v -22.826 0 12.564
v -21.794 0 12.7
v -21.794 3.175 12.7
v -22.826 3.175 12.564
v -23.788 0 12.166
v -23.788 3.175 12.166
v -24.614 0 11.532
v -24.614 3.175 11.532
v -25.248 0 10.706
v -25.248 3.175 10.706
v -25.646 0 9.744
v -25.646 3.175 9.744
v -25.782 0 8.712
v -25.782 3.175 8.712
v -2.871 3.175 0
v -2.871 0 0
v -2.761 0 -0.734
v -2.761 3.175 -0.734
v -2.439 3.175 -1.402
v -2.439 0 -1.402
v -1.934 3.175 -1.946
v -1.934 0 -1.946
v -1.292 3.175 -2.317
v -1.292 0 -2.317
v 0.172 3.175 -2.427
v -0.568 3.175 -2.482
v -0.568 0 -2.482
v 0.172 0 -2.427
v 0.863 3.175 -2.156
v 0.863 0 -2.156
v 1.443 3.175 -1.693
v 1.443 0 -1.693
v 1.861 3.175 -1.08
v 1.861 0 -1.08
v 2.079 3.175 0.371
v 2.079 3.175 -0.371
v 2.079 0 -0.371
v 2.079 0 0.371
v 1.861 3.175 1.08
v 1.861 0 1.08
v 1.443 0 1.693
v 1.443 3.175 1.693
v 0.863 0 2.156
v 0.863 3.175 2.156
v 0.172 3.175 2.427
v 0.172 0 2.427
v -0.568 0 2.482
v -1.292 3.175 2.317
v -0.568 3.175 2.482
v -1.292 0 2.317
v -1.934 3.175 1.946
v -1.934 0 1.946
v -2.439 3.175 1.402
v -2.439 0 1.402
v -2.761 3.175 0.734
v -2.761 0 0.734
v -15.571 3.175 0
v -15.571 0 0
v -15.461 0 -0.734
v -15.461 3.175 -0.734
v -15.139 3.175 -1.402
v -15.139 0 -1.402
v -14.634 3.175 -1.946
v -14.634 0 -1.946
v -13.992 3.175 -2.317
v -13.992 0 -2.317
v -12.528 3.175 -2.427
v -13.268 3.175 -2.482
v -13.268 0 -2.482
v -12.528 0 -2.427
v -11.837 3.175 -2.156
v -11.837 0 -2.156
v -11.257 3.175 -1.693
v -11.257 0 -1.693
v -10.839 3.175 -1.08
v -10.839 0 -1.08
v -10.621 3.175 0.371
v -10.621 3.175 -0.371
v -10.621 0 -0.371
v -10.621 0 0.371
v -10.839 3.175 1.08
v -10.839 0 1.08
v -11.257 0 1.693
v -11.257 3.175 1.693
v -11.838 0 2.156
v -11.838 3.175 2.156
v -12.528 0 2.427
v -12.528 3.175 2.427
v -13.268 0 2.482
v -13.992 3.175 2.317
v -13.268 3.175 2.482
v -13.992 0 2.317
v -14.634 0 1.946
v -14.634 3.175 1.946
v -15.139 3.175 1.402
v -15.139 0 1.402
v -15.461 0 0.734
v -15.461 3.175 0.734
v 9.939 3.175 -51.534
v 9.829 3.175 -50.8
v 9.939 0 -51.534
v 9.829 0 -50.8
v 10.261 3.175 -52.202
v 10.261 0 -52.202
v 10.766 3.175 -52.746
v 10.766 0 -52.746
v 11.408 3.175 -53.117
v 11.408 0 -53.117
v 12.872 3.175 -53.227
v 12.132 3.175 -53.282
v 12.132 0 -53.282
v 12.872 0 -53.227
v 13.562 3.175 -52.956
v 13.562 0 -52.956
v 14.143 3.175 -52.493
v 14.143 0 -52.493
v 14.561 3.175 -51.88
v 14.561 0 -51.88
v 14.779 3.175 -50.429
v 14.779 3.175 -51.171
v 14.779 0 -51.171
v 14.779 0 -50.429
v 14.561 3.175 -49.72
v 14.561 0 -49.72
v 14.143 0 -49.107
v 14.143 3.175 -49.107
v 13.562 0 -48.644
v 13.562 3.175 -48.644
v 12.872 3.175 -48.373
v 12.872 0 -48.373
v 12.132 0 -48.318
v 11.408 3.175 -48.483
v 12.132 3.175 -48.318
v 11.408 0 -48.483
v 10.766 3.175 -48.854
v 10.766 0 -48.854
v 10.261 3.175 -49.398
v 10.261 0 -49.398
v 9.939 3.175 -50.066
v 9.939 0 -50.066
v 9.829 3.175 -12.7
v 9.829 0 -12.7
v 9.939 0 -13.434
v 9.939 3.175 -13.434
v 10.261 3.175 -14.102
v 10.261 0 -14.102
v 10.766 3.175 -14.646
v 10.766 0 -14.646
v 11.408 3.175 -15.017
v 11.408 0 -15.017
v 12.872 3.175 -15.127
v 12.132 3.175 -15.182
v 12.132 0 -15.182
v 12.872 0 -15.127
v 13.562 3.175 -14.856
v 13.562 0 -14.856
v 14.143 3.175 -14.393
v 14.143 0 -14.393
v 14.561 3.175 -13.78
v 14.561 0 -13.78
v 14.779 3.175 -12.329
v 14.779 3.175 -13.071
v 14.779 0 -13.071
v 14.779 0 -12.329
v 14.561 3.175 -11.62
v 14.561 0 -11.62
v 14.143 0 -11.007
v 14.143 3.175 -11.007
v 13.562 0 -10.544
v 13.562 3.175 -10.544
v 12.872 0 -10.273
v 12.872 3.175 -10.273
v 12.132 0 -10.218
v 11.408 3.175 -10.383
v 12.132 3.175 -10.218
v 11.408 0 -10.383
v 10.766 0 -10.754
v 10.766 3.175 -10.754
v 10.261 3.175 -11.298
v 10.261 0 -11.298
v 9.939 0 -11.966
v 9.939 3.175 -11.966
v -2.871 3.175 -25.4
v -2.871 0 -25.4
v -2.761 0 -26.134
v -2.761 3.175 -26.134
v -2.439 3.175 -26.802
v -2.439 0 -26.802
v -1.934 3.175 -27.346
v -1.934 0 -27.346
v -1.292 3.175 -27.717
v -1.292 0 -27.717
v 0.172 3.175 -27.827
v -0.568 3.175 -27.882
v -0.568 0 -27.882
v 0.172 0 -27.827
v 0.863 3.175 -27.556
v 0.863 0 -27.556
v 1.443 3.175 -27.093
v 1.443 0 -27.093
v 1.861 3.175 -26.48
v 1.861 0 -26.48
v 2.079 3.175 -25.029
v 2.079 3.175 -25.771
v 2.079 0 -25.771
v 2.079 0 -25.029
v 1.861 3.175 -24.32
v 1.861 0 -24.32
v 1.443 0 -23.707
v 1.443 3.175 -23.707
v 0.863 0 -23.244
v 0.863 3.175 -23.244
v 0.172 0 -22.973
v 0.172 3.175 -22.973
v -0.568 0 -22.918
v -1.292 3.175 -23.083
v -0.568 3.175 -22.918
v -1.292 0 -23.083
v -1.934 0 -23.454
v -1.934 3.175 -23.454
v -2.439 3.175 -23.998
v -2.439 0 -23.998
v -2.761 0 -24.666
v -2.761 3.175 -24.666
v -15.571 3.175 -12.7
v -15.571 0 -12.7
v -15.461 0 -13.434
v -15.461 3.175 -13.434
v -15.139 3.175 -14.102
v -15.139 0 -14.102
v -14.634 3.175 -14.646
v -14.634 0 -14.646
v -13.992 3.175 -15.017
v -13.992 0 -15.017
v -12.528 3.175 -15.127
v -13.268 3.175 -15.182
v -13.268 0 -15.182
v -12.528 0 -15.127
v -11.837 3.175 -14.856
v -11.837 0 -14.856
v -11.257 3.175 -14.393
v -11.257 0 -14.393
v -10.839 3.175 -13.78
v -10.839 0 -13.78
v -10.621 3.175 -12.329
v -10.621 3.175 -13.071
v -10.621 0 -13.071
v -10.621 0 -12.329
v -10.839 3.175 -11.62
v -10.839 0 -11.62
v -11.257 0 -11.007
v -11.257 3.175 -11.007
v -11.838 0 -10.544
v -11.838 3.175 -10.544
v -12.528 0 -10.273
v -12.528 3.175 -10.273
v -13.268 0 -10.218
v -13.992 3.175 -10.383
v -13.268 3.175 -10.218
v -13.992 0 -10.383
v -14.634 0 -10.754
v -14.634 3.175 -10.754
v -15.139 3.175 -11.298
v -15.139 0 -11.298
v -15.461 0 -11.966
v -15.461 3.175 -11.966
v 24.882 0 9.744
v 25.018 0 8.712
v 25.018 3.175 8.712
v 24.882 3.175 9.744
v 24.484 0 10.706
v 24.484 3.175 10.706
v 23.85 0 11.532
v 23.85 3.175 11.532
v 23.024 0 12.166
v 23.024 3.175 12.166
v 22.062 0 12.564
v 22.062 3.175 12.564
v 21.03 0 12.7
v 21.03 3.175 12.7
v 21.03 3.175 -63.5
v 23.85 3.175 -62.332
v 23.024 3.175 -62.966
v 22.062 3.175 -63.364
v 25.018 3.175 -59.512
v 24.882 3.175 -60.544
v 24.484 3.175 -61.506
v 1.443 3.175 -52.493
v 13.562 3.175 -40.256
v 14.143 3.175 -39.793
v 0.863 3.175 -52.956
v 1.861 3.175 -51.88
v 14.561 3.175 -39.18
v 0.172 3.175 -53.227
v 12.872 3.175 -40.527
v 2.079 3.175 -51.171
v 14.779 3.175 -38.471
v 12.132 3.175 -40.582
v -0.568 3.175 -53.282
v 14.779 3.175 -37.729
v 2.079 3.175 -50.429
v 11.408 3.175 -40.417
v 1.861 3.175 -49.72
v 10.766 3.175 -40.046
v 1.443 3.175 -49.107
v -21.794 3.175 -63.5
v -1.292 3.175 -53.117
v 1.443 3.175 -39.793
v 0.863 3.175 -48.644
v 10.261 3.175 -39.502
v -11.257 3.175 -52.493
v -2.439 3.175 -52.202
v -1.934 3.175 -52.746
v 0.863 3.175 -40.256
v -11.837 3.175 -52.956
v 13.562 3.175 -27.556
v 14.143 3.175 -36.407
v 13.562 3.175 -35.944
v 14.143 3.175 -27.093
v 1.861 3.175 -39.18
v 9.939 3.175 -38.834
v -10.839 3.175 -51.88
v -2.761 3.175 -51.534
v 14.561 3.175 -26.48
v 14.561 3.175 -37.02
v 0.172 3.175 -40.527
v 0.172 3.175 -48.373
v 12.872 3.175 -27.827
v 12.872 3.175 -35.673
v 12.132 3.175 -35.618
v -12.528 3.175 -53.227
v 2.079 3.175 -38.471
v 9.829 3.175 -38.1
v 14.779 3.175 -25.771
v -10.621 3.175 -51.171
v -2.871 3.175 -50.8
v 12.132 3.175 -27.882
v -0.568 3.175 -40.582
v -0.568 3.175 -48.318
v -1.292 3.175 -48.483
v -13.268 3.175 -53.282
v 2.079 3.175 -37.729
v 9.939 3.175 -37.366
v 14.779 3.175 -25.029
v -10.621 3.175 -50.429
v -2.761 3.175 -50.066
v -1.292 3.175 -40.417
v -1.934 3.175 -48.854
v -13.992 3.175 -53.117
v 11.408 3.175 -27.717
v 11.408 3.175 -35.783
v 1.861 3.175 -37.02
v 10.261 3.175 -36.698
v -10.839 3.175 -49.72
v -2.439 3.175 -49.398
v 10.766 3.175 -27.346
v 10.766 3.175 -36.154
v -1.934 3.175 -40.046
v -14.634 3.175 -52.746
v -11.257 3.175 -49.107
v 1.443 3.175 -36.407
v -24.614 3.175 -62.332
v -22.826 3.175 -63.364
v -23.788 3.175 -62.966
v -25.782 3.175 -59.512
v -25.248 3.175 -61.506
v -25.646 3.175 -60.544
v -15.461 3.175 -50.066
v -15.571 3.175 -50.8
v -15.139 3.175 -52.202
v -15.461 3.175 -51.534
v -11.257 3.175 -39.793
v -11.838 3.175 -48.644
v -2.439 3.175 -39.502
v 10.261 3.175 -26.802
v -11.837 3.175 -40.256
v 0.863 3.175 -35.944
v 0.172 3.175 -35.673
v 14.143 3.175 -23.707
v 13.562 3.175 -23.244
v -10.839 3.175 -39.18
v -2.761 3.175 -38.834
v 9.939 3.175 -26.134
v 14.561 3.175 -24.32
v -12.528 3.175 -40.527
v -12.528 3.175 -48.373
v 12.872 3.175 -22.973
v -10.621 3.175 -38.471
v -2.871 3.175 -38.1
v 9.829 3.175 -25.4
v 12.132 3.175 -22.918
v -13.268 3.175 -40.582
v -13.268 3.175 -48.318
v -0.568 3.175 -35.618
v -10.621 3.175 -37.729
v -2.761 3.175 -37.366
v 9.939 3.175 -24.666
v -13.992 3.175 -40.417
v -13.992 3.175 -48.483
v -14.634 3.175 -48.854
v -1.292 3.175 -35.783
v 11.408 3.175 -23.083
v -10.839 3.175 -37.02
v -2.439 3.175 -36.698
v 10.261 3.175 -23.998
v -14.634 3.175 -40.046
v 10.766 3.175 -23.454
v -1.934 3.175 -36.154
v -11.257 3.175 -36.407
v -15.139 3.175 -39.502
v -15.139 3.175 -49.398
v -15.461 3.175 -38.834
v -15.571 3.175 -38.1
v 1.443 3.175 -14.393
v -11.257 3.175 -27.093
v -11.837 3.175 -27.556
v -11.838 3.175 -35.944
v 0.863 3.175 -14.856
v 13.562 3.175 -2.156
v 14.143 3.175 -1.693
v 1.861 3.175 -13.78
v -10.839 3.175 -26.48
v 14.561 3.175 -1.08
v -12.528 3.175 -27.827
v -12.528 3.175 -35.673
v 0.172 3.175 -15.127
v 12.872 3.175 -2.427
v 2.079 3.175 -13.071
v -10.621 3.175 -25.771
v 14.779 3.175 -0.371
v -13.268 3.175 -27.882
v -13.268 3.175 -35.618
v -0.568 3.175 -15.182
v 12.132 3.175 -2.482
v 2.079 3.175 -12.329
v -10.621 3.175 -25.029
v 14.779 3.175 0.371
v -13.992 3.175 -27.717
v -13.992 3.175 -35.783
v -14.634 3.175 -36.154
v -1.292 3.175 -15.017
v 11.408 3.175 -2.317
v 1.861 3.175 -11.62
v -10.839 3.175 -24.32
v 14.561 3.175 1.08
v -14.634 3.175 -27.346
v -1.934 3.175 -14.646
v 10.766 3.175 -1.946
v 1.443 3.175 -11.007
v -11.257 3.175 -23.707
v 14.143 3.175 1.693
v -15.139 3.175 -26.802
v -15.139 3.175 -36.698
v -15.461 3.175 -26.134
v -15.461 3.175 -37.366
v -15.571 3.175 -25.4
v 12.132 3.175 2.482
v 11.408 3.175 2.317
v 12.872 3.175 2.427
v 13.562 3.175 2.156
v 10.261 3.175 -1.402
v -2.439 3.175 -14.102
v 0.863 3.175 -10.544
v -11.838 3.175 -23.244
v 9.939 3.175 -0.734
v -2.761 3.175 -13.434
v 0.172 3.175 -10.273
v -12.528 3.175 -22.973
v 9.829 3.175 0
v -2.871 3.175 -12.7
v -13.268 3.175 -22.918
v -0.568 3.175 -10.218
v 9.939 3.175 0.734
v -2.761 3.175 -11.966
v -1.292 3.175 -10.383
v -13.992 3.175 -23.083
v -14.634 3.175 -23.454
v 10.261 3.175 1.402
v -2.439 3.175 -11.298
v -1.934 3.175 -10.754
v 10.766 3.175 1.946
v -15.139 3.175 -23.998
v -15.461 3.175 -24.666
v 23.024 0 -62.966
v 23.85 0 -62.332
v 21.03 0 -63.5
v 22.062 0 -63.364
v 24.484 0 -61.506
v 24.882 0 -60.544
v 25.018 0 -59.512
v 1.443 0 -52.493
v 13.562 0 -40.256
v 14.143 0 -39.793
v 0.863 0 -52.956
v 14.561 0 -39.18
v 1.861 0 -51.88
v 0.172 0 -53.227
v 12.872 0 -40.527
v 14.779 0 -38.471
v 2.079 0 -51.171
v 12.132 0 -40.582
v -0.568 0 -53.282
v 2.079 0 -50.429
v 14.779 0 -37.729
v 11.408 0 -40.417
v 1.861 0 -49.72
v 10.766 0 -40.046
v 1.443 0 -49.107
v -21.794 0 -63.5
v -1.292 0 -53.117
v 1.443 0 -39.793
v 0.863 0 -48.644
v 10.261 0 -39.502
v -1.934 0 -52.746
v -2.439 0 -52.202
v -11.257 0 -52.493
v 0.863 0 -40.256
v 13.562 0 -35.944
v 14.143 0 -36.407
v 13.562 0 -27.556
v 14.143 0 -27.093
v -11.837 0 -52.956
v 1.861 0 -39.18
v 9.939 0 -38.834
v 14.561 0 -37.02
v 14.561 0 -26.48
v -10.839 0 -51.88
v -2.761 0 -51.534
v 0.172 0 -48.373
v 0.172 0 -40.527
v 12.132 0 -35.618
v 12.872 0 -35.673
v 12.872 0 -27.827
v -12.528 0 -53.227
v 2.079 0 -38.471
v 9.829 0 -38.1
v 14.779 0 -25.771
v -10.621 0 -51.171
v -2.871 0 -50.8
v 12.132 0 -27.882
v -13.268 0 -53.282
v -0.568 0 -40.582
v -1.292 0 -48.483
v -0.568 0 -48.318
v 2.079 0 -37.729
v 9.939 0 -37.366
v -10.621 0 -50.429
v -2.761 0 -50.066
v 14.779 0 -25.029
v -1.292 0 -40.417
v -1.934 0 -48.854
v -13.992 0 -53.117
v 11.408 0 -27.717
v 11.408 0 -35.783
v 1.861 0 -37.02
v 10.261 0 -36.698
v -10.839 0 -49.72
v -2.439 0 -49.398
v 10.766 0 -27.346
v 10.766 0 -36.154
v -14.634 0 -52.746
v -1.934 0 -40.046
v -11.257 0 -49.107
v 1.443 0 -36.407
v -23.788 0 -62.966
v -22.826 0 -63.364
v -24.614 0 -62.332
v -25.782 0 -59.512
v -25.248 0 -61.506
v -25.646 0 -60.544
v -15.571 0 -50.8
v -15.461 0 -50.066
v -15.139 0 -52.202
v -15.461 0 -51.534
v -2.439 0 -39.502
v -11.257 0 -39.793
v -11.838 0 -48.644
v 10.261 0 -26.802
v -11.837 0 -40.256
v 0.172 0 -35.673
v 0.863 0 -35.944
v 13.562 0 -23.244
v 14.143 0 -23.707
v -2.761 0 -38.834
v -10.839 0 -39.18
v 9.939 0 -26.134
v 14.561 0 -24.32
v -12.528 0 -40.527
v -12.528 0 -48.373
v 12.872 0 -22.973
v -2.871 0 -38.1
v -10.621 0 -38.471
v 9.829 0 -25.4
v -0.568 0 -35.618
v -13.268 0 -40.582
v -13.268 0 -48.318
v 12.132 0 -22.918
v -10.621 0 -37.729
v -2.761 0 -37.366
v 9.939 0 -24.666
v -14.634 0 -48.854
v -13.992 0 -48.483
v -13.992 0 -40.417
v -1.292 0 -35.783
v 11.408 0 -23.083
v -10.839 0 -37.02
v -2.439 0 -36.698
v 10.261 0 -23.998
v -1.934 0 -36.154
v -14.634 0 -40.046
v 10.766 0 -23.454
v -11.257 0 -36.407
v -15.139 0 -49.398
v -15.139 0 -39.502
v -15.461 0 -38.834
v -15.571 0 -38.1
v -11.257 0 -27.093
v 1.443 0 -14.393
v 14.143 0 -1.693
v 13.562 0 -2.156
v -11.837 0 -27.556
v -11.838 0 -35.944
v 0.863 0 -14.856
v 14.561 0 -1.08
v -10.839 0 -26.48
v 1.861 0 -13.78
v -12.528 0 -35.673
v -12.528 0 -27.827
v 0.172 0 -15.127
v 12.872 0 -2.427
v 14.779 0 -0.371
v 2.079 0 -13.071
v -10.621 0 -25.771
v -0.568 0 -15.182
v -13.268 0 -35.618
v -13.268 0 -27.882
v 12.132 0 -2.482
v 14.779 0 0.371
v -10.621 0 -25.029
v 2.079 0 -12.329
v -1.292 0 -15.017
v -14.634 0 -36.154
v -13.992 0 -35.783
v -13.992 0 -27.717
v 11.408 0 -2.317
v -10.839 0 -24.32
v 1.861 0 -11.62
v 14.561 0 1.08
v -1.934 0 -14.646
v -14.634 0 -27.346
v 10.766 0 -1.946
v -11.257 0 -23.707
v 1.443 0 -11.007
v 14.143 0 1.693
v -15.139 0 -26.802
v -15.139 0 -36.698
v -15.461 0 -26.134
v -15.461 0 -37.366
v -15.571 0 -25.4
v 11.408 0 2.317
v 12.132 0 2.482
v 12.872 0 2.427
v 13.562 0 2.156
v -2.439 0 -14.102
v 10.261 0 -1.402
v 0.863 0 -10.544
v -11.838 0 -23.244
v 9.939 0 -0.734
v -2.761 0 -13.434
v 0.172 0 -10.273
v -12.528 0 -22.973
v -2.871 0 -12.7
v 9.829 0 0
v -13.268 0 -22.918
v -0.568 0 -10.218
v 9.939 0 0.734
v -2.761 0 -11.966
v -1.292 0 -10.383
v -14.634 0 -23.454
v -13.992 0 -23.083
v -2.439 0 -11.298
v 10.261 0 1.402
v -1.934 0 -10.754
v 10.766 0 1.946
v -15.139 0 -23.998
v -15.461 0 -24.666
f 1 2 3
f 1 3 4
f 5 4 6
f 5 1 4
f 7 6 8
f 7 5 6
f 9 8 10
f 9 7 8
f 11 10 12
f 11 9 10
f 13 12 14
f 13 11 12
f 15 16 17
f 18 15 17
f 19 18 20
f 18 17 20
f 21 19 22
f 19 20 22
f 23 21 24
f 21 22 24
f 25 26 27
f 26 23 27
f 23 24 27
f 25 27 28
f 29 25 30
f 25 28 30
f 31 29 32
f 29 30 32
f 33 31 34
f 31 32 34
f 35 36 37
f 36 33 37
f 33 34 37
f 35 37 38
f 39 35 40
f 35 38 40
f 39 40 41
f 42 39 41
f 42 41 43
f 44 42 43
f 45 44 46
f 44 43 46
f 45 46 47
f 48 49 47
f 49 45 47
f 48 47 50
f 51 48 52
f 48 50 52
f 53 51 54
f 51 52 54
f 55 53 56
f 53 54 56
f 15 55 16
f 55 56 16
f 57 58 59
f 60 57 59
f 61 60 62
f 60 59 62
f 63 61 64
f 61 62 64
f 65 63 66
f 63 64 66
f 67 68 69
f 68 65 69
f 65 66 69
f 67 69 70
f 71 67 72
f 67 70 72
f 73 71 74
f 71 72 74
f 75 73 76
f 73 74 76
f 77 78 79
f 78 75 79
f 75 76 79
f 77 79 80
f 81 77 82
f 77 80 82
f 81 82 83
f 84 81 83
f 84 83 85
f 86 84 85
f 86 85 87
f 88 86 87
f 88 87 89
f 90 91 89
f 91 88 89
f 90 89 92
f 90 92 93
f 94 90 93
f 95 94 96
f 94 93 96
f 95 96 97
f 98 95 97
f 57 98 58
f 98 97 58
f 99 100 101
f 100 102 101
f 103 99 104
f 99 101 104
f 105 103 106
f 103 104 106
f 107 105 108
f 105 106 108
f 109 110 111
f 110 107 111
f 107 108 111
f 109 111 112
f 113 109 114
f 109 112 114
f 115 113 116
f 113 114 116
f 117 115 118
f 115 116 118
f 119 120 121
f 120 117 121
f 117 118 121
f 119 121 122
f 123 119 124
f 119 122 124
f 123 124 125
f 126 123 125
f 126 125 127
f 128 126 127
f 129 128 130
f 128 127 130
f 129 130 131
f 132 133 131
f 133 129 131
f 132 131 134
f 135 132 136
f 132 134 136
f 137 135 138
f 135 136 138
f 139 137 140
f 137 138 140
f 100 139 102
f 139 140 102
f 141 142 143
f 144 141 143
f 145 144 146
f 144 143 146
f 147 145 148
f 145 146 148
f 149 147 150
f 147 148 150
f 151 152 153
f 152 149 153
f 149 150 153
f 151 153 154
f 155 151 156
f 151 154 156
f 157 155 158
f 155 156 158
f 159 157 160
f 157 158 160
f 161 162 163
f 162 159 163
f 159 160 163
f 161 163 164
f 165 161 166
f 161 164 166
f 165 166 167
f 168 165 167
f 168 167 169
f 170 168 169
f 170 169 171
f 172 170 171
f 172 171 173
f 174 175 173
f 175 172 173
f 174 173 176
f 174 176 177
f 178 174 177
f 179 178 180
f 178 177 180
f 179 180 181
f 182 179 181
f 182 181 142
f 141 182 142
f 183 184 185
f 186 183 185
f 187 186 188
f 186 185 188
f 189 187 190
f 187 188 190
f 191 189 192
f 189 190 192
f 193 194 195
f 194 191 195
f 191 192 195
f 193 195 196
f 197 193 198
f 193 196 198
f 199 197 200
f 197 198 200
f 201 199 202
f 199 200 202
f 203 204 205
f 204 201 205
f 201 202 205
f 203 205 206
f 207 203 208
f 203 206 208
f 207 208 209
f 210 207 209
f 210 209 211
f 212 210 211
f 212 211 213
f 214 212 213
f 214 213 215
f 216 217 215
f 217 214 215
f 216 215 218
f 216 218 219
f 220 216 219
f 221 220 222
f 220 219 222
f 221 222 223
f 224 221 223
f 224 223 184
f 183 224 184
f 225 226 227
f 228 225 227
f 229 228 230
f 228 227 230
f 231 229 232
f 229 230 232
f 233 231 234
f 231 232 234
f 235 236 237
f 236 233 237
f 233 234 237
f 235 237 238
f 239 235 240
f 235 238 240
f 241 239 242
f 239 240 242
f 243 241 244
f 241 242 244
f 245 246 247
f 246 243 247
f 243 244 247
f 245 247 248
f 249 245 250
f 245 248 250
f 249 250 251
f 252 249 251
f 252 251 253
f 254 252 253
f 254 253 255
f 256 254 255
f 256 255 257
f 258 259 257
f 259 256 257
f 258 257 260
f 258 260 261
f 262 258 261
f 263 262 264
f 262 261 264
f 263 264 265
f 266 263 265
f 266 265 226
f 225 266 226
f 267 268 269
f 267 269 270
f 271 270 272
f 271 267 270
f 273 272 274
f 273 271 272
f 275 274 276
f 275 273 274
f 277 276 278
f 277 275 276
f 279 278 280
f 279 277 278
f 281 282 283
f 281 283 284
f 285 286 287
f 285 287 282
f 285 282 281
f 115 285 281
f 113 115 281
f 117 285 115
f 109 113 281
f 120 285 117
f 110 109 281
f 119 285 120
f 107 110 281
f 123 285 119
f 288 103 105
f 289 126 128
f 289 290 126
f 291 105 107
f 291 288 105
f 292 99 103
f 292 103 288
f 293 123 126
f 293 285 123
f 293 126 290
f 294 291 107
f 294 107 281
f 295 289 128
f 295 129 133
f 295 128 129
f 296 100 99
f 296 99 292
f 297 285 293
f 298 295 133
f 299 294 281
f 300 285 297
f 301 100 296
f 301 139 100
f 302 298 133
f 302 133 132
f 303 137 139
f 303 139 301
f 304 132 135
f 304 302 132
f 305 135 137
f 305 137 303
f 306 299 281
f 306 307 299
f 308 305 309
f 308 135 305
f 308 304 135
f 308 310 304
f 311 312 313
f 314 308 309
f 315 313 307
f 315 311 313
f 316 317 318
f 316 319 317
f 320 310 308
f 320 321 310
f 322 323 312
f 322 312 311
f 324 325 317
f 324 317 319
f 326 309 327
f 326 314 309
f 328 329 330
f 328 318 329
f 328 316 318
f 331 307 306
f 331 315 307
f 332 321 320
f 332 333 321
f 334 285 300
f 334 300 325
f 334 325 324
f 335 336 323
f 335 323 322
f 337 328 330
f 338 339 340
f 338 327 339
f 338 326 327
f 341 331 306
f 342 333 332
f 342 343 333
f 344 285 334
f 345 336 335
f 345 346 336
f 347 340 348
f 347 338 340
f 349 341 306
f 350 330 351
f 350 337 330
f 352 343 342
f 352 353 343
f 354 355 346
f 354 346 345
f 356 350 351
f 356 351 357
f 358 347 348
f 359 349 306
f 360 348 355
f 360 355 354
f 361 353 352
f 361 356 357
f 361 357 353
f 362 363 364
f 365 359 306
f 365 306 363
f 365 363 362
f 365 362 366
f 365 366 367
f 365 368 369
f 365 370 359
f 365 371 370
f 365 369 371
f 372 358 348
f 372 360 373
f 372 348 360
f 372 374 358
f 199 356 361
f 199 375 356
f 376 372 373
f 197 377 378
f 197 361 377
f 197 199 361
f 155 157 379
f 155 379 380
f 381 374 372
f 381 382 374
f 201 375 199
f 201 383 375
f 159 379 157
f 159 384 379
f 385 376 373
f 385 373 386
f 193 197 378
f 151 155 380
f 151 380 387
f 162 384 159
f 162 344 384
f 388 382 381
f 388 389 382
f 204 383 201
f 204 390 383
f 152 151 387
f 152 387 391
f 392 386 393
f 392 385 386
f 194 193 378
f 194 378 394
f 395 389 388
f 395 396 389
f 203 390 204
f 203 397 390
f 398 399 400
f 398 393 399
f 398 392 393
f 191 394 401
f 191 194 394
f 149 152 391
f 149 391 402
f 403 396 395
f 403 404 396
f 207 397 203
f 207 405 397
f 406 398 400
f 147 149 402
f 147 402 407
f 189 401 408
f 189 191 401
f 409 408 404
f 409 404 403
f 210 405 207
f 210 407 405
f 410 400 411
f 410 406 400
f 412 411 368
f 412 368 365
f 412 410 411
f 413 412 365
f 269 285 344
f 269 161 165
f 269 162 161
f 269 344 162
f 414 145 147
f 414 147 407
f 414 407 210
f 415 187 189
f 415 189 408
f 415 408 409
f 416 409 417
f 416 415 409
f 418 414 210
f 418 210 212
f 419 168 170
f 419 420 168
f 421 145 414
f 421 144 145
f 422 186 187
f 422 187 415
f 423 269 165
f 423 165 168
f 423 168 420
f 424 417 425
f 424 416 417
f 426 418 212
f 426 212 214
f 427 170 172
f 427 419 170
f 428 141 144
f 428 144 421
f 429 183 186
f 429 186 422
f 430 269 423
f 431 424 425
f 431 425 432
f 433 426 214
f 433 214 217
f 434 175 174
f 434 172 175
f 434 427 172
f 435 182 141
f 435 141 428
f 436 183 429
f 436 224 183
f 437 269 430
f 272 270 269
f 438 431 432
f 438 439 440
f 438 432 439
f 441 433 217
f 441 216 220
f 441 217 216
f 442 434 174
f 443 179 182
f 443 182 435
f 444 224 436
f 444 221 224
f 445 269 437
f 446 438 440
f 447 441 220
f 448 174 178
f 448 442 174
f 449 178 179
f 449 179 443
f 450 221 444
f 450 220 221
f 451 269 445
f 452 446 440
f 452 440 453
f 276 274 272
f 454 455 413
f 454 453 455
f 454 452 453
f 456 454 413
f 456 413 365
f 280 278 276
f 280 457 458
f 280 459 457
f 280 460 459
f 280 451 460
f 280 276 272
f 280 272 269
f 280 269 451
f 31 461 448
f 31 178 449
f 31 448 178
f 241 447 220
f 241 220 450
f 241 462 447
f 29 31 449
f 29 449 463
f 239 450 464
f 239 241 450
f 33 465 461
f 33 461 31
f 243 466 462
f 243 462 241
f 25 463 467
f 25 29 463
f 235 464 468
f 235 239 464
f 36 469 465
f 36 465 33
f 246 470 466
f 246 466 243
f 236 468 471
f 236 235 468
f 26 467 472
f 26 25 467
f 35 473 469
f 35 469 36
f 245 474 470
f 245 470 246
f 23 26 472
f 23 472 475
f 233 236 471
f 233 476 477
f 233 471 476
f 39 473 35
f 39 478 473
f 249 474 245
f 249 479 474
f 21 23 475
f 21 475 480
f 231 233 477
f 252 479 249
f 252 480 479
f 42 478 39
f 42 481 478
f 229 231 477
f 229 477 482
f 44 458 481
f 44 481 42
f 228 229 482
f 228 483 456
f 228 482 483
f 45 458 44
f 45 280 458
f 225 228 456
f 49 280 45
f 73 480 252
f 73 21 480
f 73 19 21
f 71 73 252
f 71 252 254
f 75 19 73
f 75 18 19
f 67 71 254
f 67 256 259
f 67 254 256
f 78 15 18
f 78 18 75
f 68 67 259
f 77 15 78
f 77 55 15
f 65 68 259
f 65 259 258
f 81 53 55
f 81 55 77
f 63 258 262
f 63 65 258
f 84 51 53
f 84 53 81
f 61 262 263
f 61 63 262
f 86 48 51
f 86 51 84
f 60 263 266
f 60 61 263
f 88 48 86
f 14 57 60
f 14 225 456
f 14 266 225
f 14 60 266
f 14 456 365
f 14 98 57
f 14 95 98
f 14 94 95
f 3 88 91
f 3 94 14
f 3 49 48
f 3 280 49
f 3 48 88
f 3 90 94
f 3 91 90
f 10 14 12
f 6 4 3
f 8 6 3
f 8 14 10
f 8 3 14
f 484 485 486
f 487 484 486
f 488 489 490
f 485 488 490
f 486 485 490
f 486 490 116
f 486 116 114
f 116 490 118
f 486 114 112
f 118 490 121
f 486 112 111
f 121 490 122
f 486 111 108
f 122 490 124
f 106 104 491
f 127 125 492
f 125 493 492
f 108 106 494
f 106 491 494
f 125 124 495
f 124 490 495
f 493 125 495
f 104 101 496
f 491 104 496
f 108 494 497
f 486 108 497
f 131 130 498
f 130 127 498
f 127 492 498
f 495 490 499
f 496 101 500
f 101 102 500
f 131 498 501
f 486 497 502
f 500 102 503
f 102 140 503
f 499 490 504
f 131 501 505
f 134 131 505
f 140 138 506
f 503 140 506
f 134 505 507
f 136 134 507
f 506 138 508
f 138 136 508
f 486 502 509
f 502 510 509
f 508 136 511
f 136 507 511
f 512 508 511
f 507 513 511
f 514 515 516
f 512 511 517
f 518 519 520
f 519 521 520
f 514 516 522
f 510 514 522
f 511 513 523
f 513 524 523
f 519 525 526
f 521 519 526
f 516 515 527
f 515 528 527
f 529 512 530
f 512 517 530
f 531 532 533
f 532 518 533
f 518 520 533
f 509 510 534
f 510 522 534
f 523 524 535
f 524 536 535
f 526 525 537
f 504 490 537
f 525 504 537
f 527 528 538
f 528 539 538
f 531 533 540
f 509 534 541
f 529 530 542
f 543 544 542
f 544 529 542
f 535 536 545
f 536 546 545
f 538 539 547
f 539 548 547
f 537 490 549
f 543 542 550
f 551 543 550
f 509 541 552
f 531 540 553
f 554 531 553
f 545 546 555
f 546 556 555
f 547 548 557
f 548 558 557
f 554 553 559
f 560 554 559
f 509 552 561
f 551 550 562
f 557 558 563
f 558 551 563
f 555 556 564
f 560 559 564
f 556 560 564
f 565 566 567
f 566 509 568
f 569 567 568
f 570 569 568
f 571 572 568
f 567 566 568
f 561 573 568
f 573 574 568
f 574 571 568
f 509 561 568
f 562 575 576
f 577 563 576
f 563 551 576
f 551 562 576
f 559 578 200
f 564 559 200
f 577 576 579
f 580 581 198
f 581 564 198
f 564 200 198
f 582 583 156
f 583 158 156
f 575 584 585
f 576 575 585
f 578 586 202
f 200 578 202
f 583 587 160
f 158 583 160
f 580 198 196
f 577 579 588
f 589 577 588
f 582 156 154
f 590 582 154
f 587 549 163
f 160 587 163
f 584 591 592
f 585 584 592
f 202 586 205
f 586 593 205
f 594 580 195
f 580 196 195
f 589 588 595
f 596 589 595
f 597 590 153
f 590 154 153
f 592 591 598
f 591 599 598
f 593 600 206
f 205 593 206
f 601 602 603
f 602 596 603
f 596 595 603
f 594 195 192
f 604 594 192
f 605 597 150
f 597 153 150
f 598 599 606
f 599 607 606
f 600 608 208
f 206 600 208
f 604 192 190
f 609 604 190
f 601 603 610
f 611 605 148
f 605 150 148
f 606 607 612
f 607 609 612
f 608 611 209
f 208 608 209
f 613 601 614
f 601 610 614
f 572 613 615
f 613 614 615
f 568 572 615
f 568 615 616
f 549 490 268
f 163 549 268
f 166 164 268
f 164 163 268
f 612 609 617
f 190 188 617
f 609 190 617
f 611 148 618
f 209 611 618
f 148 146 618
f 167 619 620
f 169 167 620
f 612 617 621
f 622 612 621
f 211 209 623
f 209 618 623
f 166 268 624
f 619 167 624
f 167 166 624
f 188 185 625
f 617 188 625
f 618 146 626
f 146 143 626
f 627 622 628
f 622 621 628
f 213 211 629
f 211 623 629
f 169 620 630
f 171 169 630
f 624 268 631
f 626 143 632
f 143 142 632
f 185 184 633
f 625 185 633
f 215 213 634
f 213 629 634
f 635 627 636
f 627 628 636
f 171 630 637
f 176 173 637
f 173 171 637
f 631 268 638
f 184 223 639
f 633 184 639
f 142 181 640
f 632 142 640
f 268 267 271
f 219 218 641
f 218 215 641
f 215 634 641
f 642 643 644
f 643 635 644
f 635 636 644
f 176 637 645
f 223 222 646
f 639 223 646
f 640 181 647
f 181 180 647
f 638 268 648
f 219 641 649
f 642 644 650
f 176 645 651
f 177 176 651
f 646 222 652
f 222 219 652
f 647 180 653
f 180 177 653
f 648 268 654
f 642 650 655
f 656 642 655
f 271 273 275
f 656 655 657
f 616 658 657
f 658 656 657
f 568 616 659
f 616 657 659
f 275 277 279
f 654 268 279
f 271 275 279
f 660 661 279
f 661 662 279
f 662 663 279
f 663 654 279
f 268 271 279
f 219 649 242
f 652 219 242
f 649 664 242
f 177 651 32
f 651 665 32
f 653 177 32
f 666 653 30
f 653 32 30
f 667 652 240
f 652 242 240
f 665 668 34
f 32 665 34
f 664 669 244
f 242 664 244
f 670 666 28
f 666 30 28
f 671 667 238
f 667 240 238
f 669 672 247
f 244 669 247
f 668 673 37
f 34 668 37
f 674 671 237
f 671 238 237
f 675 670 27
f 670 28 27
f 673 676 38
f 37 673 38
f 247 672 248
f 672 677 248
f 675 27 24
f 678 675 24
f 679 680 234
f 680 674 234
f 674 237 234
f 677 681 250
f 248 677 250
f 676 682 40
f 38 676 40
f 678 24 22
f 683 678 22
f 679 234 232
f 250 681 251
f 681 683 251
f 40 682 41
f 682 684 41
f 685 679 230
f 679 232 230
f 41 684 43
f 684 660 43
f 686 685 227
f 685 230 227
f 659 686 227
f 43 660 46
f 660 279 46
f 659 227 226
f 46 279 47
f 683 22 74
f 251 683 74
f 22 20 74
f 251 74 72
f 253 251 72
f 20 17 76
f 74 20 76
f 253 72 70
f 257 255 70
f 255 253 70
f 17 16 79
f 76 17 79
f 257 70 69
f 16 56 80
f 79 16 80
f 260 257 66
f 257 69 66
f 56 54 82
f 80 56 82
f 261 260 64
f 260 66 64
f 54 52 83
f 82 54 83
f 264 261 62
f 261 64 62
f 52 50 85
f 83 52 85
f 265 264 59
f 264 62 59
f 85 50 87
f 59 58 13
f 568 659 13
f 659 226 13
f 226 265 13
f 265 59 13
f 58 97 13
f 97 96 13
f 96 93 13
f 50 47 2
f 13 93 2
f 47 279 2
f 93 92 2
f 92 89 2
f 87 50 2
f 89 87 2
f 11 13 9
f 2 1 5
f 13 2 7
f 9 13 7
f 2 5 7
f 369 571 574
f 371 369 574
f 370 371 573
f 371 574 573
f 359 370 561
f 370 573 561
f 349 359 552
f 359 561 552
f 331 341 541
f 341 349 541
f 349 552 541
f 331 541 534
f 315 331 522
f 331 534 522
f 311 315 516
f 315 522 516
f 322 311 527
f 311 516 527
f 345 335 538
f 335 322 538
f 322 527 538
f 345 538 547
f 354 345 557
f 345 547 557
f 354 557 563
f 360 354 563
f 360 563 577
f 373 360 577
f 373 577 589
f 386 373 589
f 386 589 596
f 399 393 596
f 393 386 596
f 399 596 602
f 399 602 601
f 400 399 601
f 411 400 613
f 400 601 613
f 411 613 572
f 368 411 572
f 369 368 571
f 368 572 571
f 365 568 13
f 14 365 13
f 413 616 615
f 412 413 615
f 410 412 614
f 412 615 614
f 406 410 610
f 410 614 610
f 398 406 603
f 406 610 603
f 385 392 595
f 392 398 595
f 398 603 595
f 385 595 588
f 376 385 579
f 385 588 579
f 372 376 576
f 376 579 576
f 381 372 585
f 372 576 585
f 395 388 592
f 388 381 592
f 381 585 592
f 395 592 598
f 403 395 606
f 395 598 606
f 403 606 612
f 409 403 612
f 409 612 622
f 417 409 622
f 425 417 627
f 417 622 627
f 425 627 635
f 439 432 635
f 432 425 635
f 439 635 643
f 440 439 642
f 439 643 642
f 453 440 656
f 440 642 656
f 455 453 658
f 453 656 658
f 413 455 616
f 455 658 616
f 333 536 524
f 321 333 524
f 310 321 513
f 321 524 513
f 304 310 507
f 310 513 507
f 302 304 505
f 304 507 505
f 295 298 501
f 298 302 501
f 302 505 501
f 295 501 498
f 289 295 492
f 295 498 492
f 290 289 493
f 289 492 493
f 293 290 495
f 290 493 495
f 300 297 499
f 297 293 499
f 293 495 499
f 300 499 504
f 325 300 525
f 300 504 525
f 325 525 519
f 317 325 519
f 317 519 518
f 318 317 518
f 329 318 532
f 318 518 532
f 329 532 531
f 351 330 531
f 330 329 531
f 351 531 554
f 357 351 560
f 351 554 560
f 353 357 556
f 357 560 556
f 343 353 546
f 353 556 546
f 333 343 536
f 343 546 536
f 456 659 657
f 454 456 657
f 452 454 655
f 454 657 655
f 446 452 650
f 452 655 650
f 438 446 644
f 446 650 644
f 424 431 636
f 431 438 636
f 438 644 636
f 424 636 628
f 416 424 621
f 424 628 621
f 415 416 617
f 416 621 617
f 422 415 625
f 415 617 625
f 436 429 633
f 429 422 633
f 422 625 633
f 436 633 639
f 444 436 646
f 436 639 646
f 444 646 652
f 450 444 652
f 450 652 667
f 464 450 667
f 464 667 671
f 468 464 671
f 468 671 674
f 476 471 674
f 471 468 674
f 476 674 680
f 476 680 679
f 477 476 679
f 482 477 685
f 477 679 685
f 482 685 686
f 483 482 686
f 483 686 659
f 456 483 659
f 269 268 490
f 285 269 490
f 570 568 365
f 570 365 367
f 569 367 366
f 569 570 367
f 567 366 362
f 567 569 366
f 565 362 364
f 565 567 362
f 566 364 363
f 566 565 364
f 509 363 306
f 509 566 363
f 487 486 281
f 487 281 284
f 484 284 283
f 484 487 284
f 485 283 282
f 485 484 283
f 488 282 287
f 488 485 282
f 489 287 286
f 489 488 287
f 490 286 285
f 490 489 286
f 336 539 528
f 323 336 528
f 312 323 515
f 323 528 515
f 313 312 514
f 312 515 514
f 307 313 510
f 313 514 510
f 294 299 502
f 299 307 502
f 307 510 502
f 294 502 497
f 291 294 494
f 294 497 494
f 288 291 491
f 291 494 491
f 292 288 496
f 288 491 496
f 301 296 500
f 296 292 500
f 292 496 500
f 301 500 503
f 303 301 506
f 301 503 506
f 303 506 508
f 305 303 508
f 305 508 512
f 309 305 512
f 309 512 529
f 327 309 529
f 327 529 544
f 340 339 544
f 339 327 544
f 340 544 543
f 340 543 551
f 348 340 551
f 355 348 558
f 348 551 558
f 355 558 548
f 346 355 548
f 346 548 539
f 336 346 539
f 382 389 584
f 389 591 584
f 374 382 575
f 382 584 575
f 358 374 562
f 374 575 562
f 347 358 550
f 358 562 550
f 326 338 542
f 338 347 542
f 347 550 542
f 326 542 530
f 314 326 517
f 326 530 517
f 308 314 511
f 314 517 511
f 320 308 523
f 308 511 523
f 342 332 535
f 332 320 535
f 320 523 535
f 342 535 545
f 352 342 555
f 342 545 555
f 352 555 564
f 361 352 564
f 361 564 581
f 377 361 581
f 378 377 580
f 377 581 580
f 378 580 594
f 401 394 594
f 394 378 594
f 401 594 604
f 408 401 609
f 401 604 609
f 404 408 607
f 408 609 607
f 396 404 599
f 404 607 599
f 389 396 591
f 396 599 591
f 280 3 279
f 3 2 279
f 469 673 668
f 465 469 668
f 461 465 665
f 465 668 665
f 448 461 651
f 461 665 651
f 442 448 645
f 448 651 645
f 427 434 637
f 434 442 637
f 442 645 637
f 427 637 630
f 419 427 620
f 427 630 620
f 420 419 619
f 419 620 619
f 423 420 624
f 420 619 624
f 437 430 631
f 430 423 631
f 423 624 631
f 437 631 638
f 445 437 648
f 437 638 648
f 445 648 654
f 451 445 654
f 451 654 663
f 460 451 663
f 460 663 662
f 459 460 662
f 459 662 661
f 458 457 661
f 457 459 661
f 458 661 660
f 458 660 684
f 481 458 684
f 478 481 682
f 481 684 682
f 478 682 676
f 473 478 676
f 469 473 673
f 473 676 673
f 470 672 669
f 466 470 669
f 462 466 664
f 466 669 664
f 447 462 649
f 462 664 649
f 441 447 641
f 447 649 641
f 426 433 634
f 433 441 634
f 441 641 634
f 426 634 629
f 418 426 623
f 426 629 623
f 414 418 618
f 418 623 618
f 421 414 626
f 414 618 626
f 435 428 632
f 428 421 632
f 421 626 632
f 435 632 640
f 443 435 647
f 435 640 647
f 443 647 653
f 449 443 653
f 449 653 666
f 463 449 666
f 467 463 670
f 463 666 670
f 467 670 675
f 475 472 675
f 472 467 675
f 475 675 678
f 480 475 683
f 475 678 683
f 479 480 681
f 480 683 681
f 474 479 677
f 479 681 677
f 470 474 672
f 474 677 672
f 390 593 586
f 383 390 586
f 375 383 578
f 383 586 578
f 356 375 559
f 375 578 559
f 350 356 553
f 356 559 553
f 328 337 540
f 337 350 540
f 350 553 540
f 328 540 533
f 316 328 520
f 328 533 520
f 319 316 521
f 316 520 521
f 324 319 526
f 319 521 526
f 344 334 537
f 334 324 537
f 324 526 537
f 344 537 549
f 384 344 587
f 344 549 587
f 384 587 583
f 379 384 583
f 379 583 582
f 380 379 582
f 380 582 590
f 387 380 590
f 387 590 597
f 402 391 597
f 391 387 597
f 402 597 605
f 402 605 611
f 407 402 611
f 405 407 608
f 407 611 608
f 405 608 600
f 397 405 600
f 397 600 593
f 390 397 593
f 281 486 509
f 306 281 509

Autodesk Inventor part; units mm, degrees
ref_plane "YZ Plane" through (0, 0, 0) normal (1, 0, 0) x (0, 1, 0)
ref_plane "XZ Plane" through (0, 0, 0) normal (0, 1, 0) x (-1, 0, 0)
ref_plane "XY Plane" through (0, 0, 0) normal (0, 0, 1) x (1, 0, 0)
sketch "Sketch1" plane through (0, 0, 0) normal (0, 1, 0) x (-1, 0, 0)
  circle A0 centre (13.0821, 0) radius 2.4892
  circle A1 centre (0.3821, 0) radius 2.4892
  line L0 (0, 10.7252) -> (0, 9.1262) construction
  circle A2 centre (-12.3179, 0) radius 2.4892
  circle A3 centre (13.0821, -12.7) radius 2.4892
  circle A4 centre (0.3821, -12.7) radius 2.4892
  circle A5 centre (-12.3179, -12.7) radius 2.4892
  circle A6 centre (13.0821, -25.4) radius 2.4892
  circle A7 centre (0.3821, -25.4) radius 2.4892
  circle A8 centre (-12.3179, -25.4) radius 2.4892
  circle A9 centre (13.0821, -38.1) radius 2.4892
  circle A10 centre (0.3821, -38.1) radius 2.4892
  circle A11 centre (-12.3179, -38.1) radius 2.4892
  circle A12 centre (13.0821, -50.8) radius 2.4892
  circle A13 centre (0.3821, -50.8) radius 2.4892
  circle A14 centre (-12.3179, -50.8) radius 2.4892
  line L1 (21.7943, 12.7) -> (-21.0301, 12.7)
  line L2 (-25.0179, 8.7122) -> (-25.0179, -59.5122)
  line L3 (-21.0301, -63.5) -> (21.7943, -63.5)
  line L4 (25.7821, -59.5122) -> (25.7821, 8.7122)
  arc A15 (25.7821, 8.7122) -> (21.7943, 12.7) centre (21.7943, 8.7122) ccw
  arc A16 (-21.0301, 12.7) -> (-25.0179, 8.7122) centre (-21.0301, 8.7122) ccw
  arc A17 (-25.0179, -59.5122) -> (-21.0301, -63.5) centre (-21.0301, -59.5122) ccw
  arc A18 (21.7943, -63.5) -> (25.7821, -59.5122) centre (21.7943, -59.5122) ccw
  point P0 (0, 0)
  point P1 (-25.0179, -63.5)
  point P2 (-25.0179, 12.7)
  point P3 (25.7821, -63.5)
  dimension "d0" = 4.9784
  dimension "d1" = 4.9784
  dimension "d2" = 12.7
  dimension "d3" = 4.9784
  dimension "d4" = 12.7
  dimension "d7" = 12.7
  dimension "d14" = 50.8
  dimension "d15" = 76.2
  dimension "d16" = 3.9878
extrude "Extrusion1" add sketch "Sketch1" along normal blind 3.175
properties part number "3x5-Grid-Gusset"
